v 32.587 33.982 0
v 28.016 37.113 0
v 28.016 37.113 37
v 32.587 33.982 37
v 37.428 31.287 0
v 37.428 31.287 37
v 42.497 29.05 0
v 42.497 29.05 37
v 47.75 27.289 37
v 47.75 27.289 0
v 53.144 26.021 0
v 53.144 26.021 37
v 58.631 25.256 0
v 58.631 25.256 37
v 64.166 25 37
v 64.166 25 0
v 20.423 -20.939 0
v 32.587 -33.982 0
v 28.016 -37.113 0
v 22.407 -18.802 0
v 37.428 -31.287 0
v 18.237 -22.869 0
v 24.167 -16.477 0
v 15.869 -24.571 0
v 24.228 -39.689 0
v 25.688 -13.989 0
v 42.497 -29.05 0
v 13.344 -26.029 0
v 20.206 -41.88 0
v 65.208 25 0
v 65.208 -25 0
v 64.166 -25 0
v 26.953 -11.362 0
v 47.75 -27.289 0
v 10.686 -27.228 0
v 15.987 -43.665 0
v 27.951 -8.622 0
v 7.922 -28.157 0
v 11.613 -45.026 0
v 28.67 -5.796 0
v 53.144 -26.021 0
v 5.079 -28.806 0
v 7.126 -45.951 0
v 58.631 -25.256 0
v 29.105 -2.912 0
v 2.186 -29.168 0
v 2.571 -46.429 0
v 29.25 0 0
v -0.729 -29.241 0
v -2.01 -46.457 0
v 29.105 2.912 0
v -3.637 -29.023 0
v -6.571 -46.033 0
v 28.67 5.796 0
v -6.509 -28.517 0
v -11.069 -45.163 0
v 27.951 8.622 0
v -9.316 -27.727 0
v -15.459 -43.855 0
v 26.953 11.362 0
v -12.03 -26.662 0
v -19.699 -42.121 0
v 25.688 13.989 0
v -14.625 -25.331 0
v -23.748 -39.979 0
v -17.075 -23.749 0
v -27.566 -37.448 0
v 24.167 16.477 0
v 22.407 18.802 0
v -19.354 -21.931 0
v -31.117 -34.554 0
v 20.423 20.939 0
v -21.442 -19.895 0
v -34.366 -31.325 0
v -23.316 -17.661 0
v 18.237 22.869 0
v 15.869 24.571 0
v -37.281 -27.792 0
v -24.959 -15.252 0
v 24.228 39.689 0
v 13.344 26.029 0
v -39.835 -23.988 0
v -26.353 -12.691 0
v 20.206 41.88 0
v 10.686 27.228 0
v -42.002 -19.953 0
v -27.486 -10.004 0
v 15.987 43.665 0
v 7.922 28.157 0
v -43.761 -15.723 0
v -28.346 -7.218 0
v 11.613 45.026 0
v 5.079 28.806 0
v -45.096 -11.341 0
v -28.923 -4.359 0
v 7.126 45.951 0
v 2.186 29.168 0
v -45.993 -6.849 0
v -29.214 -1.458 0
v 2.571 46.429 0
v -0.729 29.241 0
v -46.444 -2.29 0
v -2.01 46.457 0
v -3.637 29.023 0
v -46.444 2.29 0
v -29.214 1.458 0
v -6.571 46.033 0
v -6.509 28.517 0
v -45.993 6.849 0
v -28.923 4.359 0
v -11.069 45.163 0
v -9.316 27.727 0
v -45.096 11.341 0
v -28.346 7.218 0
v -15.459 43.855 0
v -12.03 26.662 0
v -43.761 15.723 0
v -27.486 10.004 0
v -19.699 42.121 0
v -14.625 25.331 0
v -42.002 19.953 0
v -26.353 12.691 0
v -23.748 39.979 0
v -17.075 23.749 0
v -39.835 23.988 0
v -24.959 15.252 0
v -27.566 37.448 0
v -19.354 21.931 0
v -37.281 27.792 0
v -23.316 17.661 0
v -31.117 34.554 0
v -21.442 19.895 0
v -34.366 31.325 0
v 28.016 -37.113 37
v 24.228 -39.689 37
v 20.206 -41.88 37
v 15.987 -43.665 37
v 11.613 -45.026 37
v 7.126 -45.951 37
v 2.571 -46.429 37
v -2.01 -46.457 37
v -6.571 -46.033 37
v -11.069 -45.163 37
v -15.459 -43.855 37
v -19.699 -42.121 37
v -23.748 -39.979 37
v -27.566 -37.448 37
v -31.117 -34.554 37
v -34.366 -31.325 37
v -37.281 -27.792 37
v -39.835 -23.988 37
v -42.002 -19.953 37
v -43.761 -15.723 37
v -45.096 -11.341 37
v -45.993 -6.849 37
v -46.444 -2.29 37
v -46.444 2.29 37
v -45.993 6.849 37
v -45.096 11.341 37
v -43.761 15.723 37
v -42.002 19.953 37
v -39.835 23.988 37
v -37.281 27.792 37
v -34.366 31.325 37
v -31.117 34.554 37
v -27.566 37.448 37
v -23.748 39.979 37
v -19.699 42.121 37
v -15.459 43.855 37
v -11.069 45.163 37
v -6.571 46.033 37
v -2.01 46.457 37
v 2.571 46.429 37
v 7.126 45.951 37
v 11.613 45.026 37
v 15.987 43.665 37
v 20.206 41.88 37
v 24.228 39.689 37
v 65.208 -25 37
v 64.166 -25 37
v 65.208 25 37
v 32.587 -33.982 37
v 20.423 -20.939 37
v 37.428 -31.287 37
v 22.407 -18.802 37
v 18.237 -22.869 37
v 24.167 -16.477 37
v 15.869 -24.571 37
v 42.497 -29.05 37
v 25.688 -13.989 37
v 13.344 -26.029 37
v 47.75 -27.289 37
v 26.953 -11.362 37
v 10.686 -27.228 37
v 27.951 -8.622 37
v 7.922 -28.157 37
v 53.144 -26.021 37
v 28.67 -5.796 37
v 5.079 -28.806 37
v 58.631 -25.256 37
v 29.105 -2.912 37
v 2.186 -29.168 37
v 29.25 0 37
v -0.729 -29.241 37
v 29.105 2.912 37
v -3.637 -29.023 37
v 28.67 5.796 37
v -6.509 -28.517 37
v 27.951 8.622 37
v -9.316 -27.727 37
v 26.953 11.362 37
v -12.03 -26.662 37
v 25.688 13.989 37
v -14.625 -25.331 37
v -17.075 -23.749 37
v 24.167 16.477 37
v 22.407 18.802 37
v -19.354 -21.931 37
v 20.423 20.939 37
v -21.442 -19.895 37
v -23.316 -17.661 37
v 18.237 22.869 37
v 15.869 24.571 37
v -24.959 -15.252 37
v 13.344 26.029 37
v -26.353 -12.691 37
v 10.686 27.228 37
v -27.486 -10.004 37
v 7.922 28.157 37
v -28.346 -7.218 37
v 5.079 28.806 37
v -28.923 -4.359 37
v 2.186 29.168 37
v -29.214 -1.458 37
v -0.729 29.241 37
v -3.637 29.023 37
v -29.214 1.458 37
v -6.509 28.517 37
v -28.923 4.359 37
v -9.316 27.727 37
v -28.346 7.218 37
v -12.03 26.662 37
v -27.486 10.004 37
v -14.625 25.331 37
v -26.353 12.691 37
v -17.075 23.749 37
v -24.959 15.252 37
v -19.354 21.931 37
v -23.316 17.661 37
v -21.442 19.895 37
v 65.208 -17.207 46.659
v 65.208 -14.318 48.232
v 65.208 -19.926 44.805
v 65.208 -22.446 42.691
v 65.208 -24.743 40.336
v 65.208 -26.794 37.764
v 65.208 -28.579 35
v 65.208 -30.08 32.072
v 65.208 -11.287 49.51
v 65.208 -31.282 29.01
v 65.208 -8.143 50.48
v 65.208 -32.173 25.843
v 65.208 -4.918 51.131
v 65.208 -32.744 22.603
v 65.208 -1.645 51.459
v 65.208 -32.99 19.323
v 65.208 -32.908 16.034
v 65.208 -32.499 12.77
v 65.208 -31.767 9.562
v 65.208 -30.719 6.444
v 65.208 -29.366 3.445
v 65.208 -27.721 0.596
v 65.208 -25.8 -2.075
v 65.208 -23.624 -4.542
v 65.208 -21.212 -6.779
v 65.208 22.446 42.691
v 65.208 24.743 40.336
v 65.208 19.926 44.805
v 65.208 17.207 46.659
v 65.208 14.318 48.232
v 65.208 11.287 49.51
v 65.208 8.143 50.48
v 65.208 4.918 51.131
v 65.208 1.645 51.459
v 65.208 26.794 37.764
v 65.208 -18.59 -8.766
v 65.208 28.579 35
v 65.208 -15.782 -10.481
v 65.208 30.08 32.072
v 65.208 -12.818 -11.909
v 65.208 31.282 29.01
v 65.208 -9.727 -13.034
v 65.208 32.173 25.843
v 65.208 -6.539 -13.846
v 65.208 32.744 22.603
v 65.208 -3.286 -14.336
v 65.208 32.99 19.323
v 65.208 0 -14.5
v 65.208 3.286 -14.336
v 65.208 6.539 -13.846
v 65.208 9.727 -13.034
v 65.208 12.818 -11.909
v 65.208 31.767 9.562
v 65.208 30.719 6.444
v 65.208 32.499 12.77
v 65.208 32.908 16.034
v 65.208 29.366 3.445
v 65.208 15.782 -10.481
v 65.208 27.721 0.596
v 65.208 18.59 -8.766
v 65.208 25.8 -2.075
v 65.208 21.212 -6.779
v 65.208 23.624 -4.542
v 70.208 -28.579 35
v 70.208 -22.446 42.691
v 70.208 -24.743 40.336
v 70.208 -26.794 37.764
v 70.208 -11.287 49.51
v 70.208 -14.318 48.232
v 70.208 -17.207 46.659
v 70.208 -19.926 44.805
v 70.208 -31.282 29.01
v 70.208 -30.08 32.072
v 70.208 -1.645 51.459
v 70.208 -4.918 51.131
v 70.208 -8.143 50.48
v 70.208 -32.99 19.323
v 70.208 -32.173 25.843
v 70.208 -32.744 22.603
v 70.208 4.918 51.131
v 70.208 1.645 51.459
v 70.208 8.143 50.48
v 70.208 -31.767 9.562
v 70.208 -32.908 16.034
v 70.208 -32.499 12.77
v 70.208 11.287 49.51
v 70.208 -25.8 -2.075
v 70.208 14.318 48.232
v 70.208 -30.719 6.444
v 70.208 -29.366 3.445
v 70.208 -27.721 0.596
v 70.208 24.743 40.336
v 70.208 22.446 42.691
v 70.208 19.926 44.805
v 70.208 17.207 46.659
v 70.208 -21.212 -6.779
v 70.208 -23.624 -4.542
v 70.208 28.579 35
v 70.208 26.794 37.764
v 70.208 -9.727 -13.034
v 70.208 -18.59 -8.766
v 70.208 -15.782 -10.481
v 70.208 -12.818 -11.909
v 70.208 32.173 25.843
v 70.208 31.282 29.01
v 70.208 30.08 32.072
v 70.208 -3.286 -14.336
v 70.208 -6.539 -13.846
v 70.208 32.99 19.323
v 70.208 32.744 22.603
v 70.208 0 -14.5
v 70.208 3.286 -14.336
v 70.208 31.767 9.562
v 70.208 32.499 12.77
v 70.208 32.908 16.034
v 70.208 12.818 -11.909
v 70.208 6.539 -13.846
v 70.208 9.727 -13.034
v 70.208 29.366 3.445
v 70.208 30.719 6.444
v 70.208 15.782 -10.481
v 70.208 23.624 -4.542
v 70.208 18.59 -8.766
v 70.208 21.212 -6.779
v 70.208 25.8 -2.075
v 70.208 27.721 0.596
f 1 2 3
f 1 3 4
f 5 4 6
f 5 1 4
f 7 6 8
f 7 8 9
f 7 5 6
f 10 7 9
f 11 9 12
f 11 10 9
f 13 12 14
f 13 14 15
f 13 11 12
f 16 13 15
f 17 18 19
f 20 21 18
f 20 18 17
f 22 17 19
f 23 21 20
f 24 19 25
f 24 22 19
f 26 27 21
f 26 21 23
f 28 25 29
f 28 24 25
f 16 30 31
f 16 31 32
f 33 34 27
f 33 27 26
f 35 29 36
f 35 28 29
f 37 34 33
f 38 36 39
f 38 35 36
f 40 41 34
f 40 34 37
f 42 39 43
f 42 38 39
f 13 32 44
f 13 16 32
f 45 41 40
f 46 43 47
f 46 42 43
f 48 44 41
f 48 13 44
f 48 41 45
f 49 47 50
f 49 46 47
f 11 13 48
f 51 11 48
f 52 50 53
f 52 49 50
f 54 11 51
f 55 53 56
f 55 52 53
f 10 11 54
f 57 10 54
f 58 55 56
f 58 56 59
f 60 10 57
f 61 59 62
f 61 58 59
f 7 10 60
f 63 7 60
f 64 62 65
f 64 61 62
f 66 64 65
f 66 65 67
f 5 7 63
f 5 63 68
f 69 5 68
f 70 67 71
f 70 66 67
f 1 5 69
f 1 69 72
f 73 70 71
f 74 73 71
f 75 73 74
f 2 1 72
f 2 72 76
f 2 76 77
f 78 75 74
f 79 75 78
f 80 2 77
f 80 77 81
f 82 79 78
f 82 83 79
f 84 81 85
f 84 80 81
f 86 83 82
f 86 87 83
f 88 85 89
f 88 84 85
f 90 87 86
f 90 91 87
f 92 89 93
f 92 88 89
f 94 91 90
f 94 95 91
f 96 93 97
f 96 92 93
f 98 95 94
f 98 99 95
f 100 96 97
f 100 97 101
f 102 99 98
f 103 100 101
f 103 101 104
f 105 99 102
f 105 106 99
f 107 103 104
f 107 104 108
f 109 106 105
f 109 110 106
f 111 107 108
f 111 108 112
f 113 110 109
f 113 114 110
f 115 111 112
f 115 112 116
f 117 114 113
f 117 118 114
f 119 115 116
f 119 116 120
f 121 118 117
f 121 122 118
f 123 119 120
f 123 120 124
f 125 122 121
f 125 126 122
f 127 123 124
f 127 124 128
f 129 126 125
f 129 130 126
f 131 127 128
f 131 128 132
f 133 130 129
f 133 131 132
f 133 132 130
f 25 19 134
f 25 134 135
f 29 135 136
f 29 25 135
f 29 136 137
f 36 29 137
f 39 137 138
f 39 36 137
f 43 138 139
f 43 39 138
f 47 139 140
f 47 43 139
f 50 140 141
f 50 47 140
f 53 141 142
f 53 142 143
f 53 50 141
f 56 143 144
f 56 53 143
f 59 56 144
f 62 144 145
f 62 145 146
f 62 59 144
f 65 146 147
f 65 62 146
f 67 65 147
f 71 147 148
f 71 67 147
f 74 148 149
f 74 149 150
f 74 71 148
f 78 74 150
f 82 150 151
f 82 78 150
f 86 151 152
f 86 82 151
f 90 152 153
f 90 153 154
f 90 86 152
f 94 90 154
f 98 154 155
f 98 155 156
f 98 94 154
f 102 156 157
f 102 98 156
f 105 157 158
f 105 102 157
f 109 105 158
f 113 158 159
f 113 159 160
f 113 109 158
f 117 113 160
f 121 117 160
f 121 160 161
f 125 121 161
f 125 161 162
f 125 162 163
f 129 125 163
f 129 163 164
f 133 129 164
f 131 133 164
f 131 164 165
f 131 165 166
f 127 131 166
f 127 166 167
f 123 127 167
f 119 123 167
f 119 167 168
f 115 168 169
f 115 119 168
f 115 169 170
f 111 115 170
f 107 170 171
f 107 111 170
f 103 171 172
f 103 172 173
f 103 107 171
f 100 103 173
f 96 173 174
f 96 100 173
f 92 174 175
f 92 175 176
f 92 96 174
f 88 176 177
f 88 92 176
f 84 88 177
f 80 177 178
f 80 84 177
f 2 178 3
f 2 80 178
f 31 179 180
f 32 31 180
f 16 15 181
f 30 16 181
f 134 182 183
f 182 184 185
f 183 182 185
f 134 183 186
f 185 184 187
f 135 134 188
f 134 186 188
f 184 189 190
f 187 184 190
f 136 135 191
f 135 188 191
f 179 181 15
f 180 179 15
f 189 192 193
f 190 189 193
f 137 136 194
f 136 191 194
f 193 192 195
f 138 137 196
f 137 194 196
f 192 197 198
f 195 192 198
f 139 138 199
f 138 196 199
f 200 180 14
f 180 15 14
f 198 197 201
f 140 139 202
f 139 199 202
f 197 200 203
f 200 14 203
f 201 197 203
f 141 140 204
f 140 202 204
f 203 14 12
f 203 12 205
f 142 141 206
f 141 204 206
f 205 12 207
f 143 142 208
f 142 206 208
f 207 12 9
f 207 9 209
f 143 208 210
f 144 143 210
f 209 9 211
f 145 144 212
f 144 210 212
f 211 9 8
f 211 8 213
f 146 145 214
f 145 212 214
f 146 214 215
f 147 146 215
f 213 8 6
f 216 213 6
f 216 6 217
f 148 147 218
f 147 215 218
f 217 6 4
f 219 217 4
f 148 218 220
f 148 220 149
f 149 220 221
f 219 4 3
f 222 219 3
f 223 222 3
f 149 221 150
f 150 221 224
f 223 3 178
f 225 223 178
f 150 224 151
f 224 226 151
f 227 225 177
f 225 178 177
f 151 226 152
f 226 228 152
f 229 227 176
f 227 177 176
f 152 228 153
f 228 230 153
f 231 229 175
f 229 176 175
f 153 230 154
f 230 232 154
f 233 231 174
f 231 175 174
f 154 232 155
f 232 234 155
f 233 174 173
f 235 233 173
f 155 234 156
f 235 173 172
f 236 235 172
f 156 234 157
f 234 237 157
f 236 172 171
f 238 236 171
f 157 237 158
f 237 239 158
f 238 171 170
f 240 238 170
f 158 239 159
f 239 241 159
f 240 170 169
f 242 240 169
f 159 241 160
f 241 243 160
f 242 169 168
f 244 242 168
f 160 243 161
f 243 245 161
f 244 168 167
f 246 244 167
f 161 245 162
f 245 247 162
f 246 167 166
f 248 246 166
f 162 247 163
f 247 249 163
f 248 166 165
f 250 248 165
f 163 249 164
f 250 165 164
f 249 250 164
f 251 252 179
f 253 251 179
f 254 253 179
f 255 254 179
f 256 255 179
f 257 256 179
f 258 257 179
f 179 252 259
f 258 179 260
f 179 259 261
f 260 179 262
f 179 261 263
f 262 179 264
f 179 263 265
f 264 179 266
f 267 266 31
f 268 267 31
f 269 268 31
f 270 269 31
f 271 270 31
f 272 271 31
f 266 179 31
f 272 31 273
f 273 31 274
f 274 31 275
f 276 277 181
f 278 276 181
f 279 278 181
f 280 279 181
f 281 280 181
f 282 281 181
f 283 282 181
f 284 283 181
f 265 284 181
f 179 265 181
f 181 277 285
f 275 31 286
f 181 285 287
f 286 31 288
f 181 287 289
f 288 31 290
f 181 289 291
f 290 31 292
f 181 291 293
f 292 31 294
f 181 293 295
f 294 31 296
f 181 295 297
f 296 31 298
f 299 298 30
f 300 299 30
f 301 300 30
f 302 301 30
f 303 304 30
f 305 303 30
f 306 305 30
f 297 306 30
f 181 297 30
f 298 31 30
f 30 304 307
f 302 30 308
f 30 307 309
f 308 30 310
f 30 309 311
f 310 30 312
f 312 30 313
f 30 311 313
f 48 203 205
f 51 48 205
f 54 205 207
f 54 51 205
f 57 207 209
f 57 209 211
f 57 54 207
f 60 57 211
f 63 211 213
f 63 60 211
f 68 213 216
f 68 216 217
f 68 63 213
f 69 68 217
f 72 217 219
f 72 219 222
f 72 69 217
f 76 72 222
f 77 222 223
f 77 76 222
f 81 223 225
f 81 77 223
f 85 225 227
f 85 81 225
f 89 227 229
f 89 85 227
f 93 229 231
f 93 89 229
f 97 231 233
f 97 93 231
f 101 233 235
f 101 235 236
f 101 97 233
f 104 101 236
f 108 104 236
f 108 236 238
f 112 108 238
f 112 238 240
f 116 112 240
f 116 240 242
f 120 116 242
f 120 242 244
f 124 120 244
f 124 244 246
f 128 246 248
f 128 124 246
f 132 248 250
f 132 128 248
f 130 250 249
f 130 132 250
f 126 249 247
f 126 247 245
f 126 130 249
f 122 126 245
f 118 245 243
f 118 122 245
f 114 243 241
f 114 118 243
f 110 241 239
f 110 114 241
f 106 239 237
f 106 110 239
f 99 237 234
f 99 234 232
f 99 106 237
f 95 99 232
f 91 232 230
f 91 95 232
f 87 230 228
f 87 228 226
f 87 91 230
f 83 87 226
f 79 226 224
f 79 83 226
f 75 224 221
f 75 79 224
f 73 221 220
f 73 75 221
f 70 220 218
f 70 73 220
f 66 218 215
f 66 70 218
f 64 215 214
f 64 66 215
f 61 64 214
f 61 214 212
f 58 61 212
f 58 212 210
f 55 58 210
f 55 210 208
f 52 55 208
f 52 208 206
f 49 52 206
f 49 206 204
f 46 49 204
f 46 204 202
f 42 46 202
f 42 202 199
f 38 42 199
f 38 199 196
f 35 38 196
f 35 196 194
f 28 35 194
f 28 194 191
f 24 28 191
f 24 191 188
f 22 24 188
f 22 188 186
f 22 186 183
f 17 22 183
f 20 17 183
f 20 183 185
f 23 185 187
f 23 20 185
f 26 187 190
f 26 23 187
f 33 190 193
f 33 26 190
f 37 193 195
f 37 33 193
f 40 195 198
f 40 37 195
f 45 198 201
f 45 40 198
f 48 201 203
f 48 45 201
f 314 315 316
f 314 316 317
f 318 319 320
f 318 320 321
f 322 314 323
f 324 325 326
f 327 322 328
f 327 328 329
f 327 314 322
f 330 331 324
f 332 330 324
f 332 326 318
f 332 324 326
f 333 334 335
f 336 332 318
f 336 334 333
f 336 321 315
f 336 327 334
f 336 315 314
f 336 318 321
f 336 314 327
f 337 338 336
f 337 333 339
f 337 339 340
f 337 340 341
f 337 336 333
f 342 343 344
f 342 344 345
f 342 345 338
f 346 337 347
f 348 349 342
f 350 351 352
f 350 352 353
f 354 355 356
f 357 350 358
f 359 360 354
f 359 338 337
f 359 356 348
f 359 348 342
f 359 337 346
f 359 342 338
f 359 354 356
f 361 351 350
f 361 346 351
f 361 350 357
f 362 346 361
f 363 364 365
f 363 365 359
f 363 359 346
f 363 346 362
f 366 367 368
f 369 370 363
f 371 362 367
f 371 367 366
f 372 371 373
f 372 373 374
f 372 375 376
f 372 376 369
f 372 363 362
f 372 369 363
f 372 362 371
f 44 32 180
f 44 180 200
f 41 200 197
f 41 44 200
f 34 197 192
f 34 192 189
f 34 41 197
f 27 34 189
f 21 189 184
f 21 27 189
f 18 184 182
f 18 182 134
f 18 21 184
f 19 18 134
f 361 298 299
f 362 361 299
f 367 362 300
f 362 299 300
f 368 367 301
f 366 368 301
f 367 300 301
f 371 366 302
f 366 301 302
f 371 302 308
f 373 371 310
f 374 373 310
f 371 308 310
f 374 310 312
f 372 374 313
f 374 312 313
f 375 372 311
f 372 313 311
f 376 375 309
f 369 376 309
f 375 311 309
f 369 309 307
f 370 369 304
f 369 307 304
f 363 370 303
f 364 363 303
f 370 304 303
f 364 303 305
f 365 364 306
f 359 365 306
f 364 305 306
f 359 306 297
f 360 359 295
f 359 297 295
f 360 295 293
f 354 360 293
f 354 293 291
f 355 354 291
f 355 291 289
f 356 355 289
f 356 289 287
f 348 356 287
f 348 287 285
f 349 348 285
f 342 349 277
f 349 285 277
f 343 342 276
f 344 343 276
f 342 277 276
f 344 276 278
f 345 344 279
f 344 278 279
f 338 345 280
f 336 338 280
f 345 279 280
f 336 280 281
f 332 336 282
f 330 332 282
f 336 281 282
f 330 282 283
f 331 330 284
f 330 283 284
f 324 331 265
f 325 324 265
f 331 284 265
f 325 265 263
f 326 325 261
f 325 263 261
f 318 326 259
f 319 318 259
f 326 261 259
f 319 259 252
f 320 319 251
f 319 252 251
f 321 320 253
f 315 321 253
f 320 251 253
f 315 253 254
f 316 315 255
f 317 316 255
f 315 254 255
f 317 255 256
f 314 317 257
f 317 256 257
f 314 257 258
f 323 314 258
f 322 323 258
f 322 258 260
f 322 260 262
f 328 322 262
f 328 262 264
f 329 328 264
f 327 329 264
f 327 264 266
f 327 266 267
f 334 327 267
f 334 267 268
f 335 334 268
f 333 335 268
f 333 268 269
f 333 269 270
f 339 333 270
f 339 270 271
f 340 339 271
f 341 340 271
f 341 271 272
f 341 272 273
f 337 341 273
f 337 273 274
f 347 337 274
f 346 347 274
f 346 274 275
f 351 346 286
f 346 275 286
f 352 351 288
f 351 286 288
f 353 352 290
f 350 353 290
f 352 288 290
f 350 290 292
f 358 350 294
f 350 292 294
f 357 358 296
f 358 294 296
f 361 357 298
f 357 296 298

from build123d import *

# Parameters (mm, degrees)
SKETCH1_R           = 29.25
BOSS_EXTRUDE1_DEPTH = 37
SKETCH2_R           = 33
BOSS_EXTRUDE2_DEPTH = 5


with BuildPart() as part:
    # Sketch1 → Boss-Extrude1 (new body)
    with BuildSketch(Plane.XY):
        with BuildLine():
            Line((64.16580086, 25), (65.20777984, 25))
            Line((65.20777984, 25), (65.20777984, -25))
            Line((65.20777984, -25), (64.16580086, -25))
            ThreePointArc((64.16580086, -25), (45.103264783, -28.108702614), (28.016053897, -37.112676056))
            ThreePointArc((28.016053897, -37.112676056), (-46.5, 0), (28.016053897, 37.112676056))
            ThreePointArc((28.016053897, 37.112676056), (45.103264783, 28.108702614), (64.16580086, 25))
        make_face()
        Circle(SKETCH1_R, mode=Mode.SUBTRACT)
    extrude(amount=BOSS_EXTRUDE1_DEPTH)

    # Sketch2 → Boss-Extrude2 (add)
    with BuildSketch(Plane(origin=(65.20777984, 0, 0), x_dir=(0, 0, -1), z_dir=(1, 0, 0))):
        with Locations((-18.5, 0)):
            Circle(SKETCH2_R)
    extrude(amount=BOSS_EXTRUDE2_DEPTH)


solid = part.part
